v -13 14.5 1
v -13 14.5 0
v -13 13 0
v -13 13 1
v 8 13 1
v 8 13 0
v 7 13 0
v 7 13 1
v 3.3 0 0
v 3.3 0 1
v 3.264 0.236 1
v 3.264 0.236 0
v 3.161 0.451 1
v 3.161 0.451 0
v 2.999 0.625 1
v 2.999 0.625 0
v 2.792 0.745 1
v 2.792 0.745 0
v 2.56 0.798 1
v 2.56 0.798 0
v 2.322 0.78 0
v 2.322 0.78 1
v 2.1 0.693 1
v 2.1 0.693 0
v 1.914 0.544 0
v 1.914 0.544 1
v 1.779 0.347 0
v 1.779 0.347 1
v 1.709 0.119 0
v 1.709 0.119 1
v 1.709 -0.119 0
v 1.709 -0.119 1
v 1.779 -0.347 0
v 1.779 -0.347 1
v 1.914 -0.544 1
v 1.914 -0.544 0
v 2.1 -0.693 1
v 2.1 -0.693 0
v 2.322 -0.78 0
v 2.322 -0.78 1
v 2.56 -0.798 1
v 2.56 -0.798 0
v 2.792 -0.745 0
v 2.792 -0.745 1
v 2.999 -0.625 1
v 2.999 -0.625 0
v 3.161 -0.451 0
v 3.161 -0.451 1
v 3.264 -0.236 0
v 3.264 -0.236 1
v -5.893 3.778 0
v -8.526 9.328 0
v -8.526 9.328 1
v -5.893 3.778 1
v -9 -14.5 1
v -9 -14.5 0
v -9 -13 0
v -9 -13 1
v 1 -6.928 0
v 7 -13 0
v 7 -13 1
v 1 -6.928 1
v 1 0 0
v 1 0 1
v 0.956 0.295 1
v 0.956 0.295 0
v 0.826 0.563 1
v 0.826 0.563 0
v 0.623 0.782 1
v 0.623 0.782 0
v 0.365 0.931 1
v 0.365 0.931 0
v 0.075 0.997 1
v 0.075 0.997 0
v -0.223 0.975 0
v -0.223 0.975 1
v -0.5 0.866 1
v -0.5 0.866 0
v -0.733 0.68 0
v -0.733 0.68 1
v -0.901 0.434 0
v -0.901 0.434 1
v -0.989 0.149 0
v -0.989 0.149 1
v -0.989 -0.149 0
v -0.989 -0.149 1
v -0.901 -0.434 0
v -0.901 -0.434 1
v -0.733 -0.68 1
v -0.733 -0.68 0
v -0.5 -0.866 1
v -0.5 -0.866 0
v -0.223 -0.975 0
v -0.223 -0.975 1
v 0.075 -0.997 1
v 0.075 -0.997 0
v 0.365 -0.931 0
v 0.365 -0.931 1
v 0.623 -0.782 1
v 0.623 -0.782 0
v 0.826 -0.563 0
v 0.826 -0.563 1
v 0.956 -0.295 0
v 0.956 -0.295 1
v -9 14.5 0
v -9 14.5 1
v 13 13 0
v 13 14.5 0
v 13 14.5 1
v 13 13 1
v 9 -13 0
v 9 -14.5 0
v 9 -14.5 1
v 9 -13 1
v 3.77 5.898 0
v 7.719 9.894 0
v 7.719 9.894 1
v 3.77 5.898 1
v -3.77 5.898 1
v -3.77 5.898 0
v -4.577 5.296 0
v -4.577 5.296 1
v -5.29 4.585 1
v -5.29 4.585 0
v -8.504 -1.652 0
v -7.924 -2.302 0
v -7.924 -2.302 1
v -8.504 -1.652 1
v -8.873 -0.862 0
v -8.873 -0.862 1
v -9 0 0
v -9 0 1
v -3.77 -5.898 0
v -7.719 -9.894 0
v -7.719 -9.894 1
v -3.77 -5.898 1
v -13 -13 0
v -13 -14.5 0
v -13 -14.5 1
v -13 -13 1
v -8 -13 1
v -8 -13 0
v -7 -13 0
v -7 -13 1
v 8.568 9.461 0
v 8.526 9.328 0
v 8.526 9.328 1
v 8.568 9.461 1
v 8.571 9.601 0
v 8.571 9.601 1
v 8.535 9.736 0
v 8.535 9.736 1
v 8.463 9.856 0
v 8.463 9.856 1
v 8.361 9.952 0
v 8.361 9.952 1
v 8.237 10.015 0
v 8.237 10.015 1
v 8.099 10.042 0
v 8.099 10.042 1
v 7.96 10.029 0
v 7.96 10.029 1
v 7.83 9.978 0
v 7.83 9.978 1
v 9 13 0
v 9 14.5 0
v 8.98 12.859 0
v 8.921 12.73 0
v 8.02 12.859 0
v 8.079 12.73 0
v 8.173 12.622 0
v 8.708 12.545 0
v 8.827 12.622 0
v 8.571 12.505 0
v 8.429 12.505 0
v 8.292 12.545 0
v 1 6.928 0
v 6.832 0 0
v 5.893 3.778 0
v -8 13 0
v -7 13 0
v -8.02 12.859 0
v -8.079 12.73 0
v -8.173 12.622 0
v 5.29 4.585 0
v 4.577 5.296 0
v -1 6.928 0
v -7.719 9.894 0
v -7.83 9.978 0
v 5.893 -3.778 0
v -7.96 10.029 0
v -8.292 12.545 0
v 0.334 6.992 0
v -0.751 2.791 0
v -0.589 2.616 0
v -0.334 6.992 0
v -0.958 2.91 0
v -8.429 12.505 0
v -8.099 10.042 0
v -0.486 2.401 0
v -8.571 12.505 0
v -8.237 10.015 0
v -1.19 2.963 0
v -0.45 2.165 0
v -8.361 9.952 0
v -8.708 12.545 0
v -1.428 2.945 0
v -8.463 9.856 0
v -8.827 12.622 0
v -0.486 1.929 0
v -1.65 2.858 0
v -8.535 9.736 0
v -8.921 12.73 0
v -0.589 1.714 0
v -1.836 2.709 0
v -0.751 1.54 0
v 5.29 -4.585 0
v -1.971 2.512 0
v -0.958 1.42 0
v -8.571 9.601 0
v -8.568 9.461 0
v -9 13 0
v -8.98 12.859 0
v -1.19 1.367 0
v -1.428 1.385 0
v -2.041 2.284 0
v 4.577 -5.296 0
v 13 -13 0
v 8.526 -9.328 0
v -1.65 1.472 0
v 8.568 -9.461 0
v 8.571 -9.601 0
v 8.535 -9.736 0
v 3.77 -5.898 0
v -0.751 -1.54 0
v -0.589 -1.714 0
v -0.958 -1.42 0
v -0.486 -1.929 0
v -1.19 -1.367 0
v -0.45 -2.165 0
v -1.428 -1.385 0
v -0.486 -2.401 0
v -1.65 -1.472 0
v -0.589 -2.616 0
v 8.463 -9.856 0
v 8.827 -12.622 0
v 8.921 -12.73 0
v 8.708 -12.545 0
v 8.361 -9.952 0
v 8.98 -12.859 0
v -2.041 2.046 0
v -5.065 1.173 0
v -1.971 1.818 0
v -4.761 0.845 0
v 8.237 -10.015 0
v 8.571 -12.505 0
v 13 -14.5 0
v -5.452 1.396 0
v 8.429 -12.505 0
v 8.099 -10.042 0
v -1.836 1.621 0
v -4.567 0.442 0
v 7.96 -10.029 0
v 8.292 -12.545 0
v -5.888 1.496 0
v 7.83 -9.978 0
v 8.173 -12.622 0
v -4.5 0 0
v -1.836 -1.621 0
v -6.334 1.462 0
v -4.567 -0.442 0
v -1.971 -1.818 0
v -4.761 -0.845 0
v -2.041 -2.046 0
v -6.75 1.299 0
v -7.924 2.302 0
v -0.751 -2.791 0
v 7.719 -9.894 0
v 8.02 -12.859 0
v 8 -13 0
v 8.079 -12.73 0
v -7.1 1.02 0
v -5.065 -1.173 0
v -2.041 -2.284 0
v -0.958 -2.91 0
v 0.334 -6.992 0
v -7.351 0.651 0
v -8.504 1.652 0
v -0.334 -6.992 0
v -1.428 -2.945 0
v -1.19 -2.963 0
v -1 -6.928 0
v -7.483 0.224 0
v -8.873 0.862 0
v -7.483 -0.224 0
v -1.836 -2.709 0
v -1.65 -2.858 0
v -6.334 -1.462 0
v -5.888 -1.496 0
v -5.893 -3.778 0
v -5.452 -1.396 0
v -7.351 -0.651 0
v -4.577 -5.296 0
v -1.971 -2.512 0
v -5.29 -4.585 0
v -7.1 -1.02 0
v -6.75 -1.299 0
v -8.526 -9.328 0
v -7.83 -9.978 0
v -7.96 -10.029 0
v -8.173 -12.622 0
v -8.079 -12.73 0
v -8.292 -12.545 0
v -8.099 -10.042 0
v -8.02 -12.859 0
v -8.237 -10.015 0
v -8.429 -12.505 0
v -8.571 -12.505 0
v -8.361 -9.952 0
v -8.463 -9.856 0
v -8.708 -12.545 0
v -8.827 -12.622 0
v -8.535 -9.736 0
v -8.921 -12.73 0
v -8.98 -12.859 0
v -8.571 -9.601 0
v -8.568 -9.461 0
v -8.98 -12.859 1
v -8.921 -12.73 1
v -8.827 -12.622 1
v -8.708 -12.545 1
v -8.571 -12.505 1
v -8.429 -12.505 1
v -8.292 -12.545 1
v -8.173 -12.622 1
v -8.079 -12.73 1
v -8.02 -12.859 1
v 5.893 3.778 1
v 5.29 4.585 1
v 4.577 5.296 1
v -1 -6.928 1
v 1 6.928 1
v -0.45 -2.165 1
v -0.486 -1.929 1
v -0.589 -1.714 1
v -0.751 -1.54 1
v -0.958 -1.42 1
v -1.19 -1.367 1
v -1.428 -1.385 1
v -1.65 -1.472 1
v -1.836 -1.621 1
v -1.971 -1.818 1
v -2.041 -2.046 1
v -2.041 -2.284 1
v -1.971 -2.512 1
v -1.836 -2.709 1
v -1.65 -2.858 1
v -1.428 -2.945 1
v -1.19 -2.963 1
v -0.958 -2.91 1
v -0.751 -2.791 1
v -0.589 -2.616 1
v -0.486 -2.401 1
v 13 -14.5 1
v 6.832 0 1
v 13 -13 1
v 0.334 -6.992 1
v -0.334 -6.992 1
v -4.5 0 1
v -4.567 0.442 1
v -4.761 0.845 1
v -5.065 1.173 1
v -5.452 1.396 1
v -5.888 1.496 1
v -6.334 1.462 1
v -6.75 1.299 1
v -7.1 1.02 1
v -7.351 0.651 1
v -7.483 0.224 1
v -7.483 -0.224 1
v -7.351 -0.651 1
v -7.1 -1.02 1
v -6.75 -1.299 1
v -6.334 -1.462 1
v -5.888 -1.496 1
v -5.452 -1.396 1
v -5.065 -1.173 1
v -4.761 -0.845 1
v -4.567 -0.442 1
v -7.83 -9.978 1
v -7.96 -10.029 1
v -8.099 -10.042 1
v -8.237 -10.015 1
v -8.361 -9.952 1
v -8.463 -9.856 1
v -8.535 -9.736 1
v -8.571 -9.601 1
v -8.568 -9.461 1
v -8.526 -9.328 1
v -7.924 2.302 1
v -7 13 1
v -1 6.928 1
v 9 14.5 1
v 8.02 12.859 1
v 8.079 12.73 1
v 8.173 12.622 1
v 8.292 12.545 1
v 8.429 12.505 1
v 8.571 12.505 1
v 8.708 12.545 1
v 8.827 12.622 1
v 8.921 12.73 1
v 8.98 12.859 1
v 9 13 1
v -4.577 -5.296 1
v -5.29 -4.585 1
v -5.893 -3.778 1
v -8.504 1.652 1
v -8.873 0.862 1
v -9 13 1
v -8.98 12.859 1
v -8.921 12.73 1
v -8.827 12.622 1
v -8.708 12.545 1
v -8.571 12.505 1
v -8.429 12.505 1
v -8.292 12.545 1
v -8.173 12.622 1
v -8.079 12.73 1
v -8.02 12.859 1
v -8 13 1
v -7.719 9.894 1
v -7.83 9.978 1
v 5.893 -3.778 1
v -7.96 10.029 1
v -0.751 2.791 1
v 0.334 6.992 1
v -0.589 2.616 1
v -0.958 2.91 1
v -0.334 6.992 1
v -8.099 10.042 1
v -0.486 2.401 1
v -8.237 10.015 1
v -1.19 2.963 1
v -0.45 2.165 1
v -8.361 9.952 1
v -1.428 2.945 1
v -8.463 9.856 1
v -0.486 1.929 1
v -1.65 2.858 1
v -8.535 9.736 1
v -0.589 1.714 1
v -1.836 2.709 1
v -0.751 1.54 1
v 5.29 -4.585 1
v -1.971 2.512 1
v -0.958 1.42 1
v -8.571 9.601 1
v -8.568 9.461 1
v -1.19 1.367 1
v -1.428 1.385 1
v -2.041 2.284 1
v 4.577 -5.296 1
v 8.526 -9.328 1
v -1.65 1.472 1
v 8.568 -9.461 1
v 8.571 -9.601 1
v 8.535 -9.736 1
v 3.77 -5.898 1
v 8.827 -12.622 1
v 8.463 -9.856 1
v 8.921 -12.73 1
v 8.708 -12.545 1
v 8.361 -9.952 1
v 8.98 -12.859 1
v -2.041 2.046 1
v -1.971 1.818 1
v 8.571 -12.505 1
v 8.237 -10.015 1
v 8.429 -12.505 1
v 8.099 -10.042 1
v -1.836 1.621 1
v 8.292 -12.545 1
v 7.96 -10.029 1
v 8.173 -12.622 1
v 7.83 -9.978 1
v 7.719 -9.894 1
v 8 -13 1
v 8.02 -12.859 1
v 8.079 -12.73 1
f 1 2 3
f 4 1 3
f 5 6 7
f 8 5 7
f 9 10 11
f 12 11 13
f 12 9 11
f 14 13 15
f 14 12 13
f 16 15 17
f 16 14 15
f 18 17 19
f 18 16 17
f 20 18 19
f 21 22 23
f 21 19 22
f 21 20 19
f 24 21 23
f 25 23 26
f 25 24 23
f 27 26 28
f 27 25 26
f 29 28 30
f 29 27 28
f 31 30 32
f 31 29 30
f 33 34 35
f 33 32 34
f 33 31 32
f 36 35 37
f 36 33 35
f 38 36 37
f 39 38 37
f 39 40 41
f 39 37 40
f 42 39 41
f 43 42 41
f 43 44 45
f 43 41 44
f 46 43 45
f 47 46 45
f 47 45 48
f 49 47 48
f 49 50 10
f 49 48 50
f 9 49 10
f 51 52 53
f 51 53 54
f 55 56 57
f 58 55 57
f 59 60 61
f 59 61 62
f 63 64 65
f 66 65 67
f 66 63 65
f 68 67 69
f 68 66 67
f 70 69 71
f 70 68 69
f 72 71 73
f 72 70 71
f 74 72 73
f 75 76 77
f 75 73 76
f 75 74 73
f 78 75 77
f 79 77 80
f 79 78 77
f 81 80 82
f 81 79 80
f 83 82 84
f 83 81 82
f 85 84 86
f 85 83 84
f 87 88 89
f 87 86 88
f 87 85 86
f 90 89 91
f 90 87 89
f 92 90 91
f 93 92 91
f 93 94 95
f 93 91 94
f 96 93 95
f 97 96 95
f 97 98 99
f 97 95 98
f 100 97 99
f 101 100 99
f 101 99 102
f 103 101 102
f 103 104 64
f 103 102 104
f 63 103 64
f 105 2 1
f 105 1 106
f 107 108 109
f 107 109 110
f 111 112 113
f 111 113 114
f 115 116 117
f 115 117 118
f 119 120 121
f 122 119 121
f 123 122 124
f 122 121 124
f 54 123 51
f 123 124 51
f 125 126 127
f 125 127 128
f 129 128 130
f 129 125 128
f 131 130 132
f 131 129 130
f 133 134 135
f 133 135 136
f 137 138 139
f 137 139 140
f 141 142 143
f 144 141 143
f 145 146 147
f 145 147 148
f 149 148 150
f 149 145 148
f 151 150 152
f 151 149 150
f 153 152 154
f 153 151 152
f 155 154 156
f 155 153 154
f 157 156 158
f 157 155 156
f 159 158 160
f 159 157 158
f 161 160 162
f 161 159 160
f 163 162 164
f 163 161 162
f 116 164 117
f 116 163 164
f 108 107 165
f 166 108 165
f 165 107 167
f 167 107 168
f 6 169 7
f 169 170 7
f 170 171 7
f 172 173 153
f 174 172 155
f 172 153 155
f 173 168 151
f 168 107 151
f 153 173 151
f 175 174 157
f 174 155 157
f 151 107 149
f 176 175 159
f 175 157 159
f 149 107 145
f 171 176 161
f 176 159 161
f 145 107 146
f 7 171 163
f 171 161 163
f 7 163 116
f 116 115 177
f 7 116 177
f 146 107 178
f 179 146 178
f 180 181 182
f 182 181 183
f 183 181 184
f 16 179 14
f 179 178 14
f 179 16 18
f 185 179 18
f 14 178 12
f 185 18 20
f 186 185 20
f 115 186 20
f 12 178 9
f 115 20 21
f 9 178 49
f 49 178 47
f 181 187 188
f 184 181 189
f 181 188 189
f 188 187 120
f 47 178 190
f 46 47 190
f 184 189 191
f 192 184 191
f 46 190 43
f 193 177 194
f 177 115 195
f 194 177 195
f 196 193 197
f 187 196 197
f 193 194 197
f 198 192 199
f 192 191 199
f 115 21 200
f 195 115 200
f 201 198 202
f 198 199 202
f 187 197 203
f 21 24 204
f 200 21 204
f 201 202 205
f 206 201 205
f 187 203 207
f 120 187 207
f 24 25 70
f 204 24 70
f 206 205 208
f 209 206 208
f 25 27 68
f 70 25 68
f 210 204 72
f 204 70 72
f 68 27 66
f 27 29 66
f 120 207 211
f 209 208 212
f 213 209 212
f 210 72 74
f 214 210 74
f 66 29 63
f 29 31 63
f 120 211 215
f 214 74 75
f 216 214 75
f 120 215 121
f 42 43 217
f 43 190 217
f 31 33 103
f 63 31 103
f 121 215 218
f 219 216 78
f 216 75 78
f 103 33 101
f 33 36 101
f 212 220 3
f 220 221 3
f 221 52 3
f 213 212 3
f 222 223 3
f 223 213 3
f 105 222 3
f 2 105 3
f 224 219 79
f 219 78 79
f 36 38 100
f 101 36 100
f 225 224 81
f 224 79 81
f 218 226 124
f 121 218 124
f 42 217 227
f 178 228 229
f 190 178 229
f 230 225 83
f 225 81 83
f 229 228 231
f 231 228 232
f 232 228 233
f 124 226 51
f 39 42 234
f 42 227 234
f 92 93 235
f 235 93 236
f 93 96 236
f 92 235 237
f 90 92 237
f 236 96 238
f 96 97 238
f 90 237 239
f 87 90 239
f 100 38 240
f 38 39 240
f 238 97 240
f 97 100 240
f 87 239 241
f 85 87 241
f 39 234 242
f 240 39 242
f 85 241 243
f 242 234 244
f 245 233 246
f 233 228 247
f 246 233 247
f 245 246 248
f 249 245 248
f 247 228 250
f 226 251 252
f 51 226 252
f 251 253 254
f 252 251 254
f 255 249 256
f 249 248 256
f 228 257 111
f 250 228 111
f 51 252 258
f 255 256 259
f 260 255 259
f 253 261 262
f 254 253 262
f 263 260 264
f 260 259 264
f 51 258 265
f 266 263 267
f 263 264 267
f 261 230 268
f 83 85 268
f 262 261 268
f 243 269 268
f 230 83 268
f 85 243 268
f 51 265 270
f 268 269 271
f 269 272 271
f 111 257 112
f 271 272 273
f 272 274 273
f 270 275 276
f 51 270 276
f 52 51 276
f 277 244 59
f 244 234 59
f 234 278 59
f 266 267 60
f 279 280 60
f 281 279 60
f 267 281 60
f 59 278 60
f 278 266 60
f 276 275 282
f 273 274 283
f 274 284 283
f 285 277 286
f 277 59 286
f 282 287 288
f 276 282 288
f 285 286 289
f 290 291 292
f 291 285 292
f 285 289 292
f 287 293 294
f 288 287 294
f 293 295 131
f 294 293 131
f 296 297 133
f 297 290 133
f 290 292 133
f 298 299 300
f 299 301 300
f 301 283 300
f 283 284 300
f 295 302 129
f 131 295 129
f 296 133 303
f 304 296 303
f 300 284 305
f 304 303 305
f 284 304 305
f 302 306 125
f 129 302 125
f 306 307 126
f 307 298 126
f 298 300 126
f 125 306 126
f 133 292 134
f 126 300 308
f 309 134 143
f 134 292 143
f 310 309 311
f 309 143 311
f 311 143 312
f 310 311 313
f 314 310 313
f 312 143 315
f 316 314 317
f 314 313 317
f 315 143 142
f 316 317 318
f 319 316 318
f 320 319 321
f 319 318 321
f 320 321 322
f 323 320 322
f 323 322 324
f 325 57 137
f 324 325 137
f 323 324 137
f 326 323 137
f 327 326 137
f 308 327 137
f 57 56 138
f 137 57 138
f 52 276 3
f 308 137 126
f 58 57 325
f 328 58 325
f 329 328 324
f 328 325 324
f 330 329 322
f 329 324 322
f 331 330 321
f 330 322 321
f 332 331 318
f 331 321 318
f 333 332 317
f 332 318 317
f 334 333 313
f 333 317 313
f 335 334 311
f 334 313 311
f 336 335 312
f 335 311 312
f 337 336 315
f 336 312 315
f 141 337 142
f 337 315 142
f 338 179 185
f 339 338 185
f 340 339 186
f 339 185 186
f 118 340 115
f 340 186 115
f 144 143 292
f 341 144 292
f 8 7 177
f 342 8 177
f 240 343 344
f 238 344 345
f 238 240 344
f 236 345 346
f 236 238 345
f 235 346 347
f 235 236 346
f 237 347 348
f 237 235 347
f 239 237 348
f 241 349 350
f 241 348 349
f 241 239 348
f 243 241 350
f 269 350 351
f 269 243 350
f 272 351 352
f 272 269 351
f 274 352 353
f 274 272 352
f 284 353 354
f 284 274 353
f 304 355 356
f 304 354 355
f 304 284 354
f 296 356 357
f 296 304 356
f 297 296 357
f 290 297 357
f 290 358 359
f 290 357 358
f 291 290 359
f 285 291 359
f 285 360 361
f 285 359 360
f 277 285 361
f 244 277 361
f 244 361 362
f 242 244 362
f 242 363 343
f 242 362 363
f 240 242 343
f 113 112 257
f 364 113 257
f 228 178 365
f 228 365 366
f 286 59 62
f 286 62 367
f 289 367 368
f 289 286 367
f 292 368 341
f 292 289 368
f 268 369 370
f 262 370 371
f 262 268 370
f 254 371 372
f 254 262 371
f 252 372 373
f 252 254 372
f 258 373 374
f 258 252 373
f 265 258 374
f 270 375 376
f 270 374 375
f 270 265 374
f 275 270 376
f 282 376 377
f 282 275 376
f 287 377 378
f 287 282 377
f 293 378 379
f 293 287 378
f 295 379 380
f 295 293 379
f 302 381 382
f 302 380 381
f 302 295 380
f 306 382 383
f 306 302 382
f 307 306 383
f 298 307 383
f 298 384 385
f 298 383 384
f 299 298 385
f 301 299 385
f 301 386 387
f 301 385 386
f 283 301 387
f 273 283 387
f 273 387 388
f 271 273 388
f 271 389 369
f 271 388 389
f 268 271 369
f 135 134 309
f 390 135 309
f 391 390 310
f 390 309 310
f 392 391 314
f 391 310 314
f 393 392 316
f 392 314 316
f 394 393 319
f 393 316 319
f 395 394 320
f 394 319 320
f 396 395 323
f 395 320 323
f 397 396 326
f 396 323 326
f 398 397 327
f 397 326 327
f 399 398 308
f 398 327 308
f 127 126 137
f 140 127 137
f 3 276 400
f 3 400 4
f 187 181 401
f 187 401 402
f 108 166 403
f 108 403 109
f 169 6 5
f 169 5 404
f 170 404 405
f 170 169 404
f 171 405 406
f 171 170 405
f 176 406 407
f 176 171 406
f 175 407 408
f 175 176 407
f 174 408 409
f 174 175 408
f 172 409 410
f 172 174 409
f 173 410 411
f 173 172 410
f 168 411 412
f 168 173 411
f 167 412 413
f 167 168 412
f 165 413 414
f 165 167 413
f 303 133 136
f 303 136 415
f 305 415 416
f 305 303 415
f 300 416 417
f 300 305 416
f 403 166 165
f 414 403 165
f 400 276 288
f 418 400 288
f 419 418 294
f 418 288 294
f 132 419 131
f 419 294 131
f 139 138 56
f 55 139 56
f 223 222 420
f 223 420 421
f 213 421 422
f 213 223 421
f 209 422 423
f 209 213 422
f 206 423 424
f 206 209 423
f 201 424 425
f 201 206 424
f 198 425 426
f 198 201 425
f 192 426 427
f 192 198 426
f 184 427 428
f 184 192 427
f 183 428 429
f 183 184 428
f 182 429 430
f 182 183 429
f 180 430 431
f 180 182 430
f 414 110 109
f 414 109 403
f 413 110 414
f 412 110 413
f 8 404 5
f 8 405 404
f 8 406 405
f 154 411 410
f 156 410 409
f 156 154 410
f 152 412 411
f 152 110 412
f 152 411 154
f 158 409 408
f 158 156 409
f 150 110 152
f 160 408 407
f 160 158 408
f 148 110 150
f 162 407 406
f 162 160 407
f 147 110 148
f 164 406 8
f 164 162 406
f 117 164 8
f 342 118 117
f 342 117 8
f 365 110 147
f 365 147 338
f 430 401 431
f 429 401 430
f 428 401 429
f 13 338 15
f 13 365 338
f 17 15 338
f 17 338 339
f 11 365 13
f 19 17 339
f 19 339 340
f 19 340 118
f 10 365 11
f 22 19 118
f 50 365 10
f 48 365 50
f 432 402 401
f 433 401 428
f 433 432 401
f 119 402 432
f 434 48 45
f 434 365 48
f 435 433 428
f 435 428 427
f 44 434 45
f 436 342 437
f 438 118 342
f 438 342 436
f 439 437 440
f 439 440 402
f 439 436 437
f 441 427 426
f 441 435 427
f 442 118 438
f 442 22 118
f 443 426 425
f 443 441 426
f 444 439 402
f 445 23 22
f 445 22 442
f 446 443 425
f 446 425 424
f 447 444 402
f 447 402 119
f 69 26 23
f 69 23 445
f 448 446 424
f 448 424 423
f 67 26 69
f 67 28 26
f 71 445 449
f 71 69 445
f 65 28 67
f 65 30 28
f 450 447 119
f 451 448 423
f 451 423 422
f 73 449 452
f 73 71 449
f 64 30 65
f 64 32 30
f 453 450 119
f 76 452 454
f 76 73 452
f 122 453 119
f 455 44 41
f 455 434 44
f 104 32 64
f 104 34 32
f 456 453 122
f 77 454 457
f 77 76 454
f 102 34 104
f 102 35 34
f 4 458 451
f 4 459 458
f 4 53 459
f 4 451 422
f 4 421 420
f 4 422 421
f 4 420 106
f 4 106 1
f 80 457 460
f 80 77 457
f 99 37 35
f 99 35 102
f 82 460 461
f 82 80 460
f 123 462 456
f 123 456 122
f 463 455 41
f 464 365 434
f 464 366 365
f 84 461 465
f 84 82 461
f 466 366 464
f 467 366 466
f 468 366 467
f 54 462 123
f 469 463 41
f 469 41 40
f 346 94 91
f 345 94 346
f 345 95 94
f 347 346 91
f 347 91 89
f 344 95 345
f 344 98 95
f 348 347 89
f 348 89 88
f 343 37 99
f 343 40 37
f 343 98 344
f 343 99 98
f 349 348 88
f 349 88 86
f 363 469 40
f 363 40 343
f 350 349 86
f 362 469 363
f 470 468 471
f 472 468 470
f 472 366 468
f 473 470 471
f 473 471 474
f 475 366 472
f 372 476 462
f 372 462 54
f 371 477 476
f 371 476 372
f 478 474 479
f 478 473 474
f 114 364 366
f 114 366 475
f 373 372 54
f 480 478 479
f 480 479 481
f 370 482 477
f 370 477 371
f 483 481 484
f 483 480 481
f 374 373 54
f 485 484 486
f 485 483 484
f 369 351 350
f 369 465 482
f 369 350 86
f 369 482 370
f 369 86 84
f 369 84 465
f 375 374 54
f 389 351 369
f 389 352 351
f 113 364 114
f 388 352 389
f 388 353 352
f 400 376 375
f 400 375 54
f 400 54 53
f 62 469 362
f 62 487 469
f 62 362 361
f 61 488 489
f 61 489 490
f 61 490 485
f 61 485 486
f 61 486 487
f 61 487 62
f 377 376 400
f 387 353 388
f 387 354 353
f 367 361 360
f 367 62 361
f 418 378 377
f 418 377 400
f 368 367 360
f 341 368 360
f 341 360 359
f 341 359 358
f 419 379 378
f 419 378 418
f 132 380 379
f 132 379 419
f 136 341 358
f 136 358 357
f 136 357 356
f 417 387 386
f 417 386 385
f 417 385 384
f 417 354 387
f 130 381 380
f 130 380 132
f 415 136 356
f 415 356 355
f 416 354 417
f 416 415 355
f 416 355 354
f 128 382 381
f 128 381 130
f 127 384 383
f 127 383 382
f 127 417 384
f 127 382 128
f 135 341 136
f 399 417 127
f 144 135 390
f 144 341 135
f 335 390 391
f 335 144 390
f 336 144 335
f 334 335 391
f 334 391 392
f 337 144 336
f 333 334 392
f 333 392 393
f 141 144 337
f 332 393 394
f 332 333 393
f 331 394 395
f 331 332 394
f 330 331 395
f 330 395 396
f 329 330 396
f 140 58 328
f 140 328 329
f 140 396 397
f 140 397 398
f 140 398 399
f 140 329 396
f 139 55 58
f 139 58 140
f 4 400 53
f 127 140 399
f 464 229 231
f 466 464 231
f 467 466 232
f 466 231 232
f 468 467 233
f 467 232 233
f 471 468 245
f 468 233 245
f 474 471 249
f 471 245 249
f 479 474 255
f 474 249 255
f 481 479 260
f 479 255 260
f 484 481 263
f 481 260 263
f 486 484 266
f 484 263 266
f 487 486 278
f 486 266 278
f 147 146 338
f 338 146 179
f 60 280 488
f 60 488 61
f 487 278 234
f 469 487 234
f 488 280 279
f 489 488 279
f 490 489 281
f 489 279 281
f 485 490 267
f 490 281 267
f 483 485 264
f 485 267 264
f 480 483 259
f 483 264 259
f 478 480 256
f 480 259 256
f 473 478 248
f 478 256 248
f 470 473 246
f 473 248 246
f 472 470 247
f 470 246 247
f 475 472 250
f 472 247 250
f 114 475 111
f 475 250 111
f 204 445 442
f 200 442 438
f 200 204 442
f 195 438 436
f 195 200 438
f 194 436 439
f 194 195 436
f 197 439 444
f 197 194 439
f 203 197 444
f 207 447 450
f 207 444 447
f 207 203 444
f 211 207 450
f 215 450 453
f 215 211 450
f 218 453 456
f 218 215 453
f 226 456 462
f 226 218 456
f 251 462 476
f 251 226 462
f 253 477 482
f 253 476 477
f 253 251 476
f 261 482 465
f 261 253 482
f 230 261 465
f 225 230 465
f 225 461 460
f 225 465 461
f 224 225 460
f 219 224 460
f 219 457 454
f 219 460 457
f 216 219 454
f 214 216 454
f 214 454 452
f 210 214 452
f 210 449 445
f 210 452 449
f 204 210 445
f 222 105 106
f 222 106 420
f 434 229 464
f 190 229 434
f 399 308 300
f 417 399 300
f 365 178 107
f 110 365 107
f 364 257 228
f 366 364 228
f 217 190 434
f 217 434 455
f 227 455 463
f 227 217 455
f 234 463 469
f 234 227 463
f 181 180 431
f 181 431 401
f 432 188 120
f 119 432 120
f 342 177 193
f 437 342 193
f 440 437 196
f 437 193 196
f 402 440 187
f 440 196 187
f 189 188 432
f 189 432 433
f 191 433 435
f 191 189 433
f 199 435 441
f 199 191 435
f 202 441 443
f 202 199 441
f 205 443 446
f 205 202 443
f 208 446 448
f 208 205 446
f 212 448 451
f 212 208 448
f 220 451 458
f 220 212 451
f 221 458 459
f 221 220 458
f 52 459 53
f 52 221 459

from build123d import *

# Parameters (mm, degrees)
PAD_DEPTH     = 1
SKETCH008_R   = 0.8
SKETCH008_R_2 = 1
SKETCH008_R_3 = 1.5
POCKET_DEPTH  = 1.001


with BuildPart() as part:
    # Sketch007 → Pad (new body)
    with BuildSketch(Plane.XY):
        with BuildLine():
            Line((-13, 14.5), (-9, 14.5))
            Line((-9, 14.5), (-9, 13))
            ThreePointArc((-9, 13), (-8.5, 12.5), (-8, 13))
            Line((-8, 13), (-7, 13))
            Line((-7, 13), (-1, 6.928203))
            ThreePointArc((1, 6.928203), (0, 7), (-1, 6.928203))
            Line((7, 13), (1, 6.928203))
            Line((8, 13), (7, 13))
            ThreePointArc((8, 13), (8.5, 12.5), (9, 13))
            Line((9, 14.5), (9, 13))
            Line((9, 14.5), (13, 14.5))
            Line((13, 14.5), (13, 13))
            Line((6.83213, 0), (13, 13))
            Line((6.83213, 0), (-6.83213, 0))
            Line((-9, 0), (-6.83213, 0))
            ThreePointArc((-7.924155, 2.301657), (-8.717762, 1.270341), (-9, 0))
            Line((-7.924155, 2.301657), (-13, 13))
            Line((-13, 14.5), (-13, 13))
        make_face()
        with BuildLine():
            Line((-8.526013, 9.328003), (-5.892862, 3.778118))
            ThreePointArc((-3.770099, 5.897996), (-4.94638, 4.953113), (-5.892862, 3.778118))
            Line((-7.718628, 9.893773), (-3.770099, 5.897996))
            ThreePointArc((-7.718628, 9.893773), (-8.361214, 9.951801), (-8.526013, 9.328003))
        make_face(mode=Mode.SUBTRACT)
        with BuildLine():
            ThreePointArc((5.892862, 3.778118), (4.94638, 4.953113), (3.770099, 5.897996))
            Line((7.718628, 9.893773), (3.770099, 5.897996))
            ThreePointArc((8.526013, 9.328002), (8.361214, 9.951801), (7.718628, 9.893773))
            Line((8.526013, 9.328002), (5.892862, 3.778118))
        make_face(mode=Mode.SUBTRACT)
    pad = extrude(amount=PAD_DEPTH)

    # Mirrored: Pad across Sketch007 H_Axis
    add(pad.mirror(Plane.ZX))

    # Sketch008 → Pocket (cut, through all)
    with BuildSketch(Plane.XY):
        with Locations((2.5, 0)):
            Circle(SKETCH008_R)
        with Locations((-1.25, -2.165064)):
            Circle(SKETCH008_R)
        with Locations((-1.25, 2.165064)):
            Circle(SKETCH008_R)
        Circle(SKETCH008_R_2)
        with Locations((-6, 0)):
            Circle(SKETCH008_R_3)
    extrude(amount=POCKET_DEPTH, mode=Mode.SUBTRACT)


solid = part.part
